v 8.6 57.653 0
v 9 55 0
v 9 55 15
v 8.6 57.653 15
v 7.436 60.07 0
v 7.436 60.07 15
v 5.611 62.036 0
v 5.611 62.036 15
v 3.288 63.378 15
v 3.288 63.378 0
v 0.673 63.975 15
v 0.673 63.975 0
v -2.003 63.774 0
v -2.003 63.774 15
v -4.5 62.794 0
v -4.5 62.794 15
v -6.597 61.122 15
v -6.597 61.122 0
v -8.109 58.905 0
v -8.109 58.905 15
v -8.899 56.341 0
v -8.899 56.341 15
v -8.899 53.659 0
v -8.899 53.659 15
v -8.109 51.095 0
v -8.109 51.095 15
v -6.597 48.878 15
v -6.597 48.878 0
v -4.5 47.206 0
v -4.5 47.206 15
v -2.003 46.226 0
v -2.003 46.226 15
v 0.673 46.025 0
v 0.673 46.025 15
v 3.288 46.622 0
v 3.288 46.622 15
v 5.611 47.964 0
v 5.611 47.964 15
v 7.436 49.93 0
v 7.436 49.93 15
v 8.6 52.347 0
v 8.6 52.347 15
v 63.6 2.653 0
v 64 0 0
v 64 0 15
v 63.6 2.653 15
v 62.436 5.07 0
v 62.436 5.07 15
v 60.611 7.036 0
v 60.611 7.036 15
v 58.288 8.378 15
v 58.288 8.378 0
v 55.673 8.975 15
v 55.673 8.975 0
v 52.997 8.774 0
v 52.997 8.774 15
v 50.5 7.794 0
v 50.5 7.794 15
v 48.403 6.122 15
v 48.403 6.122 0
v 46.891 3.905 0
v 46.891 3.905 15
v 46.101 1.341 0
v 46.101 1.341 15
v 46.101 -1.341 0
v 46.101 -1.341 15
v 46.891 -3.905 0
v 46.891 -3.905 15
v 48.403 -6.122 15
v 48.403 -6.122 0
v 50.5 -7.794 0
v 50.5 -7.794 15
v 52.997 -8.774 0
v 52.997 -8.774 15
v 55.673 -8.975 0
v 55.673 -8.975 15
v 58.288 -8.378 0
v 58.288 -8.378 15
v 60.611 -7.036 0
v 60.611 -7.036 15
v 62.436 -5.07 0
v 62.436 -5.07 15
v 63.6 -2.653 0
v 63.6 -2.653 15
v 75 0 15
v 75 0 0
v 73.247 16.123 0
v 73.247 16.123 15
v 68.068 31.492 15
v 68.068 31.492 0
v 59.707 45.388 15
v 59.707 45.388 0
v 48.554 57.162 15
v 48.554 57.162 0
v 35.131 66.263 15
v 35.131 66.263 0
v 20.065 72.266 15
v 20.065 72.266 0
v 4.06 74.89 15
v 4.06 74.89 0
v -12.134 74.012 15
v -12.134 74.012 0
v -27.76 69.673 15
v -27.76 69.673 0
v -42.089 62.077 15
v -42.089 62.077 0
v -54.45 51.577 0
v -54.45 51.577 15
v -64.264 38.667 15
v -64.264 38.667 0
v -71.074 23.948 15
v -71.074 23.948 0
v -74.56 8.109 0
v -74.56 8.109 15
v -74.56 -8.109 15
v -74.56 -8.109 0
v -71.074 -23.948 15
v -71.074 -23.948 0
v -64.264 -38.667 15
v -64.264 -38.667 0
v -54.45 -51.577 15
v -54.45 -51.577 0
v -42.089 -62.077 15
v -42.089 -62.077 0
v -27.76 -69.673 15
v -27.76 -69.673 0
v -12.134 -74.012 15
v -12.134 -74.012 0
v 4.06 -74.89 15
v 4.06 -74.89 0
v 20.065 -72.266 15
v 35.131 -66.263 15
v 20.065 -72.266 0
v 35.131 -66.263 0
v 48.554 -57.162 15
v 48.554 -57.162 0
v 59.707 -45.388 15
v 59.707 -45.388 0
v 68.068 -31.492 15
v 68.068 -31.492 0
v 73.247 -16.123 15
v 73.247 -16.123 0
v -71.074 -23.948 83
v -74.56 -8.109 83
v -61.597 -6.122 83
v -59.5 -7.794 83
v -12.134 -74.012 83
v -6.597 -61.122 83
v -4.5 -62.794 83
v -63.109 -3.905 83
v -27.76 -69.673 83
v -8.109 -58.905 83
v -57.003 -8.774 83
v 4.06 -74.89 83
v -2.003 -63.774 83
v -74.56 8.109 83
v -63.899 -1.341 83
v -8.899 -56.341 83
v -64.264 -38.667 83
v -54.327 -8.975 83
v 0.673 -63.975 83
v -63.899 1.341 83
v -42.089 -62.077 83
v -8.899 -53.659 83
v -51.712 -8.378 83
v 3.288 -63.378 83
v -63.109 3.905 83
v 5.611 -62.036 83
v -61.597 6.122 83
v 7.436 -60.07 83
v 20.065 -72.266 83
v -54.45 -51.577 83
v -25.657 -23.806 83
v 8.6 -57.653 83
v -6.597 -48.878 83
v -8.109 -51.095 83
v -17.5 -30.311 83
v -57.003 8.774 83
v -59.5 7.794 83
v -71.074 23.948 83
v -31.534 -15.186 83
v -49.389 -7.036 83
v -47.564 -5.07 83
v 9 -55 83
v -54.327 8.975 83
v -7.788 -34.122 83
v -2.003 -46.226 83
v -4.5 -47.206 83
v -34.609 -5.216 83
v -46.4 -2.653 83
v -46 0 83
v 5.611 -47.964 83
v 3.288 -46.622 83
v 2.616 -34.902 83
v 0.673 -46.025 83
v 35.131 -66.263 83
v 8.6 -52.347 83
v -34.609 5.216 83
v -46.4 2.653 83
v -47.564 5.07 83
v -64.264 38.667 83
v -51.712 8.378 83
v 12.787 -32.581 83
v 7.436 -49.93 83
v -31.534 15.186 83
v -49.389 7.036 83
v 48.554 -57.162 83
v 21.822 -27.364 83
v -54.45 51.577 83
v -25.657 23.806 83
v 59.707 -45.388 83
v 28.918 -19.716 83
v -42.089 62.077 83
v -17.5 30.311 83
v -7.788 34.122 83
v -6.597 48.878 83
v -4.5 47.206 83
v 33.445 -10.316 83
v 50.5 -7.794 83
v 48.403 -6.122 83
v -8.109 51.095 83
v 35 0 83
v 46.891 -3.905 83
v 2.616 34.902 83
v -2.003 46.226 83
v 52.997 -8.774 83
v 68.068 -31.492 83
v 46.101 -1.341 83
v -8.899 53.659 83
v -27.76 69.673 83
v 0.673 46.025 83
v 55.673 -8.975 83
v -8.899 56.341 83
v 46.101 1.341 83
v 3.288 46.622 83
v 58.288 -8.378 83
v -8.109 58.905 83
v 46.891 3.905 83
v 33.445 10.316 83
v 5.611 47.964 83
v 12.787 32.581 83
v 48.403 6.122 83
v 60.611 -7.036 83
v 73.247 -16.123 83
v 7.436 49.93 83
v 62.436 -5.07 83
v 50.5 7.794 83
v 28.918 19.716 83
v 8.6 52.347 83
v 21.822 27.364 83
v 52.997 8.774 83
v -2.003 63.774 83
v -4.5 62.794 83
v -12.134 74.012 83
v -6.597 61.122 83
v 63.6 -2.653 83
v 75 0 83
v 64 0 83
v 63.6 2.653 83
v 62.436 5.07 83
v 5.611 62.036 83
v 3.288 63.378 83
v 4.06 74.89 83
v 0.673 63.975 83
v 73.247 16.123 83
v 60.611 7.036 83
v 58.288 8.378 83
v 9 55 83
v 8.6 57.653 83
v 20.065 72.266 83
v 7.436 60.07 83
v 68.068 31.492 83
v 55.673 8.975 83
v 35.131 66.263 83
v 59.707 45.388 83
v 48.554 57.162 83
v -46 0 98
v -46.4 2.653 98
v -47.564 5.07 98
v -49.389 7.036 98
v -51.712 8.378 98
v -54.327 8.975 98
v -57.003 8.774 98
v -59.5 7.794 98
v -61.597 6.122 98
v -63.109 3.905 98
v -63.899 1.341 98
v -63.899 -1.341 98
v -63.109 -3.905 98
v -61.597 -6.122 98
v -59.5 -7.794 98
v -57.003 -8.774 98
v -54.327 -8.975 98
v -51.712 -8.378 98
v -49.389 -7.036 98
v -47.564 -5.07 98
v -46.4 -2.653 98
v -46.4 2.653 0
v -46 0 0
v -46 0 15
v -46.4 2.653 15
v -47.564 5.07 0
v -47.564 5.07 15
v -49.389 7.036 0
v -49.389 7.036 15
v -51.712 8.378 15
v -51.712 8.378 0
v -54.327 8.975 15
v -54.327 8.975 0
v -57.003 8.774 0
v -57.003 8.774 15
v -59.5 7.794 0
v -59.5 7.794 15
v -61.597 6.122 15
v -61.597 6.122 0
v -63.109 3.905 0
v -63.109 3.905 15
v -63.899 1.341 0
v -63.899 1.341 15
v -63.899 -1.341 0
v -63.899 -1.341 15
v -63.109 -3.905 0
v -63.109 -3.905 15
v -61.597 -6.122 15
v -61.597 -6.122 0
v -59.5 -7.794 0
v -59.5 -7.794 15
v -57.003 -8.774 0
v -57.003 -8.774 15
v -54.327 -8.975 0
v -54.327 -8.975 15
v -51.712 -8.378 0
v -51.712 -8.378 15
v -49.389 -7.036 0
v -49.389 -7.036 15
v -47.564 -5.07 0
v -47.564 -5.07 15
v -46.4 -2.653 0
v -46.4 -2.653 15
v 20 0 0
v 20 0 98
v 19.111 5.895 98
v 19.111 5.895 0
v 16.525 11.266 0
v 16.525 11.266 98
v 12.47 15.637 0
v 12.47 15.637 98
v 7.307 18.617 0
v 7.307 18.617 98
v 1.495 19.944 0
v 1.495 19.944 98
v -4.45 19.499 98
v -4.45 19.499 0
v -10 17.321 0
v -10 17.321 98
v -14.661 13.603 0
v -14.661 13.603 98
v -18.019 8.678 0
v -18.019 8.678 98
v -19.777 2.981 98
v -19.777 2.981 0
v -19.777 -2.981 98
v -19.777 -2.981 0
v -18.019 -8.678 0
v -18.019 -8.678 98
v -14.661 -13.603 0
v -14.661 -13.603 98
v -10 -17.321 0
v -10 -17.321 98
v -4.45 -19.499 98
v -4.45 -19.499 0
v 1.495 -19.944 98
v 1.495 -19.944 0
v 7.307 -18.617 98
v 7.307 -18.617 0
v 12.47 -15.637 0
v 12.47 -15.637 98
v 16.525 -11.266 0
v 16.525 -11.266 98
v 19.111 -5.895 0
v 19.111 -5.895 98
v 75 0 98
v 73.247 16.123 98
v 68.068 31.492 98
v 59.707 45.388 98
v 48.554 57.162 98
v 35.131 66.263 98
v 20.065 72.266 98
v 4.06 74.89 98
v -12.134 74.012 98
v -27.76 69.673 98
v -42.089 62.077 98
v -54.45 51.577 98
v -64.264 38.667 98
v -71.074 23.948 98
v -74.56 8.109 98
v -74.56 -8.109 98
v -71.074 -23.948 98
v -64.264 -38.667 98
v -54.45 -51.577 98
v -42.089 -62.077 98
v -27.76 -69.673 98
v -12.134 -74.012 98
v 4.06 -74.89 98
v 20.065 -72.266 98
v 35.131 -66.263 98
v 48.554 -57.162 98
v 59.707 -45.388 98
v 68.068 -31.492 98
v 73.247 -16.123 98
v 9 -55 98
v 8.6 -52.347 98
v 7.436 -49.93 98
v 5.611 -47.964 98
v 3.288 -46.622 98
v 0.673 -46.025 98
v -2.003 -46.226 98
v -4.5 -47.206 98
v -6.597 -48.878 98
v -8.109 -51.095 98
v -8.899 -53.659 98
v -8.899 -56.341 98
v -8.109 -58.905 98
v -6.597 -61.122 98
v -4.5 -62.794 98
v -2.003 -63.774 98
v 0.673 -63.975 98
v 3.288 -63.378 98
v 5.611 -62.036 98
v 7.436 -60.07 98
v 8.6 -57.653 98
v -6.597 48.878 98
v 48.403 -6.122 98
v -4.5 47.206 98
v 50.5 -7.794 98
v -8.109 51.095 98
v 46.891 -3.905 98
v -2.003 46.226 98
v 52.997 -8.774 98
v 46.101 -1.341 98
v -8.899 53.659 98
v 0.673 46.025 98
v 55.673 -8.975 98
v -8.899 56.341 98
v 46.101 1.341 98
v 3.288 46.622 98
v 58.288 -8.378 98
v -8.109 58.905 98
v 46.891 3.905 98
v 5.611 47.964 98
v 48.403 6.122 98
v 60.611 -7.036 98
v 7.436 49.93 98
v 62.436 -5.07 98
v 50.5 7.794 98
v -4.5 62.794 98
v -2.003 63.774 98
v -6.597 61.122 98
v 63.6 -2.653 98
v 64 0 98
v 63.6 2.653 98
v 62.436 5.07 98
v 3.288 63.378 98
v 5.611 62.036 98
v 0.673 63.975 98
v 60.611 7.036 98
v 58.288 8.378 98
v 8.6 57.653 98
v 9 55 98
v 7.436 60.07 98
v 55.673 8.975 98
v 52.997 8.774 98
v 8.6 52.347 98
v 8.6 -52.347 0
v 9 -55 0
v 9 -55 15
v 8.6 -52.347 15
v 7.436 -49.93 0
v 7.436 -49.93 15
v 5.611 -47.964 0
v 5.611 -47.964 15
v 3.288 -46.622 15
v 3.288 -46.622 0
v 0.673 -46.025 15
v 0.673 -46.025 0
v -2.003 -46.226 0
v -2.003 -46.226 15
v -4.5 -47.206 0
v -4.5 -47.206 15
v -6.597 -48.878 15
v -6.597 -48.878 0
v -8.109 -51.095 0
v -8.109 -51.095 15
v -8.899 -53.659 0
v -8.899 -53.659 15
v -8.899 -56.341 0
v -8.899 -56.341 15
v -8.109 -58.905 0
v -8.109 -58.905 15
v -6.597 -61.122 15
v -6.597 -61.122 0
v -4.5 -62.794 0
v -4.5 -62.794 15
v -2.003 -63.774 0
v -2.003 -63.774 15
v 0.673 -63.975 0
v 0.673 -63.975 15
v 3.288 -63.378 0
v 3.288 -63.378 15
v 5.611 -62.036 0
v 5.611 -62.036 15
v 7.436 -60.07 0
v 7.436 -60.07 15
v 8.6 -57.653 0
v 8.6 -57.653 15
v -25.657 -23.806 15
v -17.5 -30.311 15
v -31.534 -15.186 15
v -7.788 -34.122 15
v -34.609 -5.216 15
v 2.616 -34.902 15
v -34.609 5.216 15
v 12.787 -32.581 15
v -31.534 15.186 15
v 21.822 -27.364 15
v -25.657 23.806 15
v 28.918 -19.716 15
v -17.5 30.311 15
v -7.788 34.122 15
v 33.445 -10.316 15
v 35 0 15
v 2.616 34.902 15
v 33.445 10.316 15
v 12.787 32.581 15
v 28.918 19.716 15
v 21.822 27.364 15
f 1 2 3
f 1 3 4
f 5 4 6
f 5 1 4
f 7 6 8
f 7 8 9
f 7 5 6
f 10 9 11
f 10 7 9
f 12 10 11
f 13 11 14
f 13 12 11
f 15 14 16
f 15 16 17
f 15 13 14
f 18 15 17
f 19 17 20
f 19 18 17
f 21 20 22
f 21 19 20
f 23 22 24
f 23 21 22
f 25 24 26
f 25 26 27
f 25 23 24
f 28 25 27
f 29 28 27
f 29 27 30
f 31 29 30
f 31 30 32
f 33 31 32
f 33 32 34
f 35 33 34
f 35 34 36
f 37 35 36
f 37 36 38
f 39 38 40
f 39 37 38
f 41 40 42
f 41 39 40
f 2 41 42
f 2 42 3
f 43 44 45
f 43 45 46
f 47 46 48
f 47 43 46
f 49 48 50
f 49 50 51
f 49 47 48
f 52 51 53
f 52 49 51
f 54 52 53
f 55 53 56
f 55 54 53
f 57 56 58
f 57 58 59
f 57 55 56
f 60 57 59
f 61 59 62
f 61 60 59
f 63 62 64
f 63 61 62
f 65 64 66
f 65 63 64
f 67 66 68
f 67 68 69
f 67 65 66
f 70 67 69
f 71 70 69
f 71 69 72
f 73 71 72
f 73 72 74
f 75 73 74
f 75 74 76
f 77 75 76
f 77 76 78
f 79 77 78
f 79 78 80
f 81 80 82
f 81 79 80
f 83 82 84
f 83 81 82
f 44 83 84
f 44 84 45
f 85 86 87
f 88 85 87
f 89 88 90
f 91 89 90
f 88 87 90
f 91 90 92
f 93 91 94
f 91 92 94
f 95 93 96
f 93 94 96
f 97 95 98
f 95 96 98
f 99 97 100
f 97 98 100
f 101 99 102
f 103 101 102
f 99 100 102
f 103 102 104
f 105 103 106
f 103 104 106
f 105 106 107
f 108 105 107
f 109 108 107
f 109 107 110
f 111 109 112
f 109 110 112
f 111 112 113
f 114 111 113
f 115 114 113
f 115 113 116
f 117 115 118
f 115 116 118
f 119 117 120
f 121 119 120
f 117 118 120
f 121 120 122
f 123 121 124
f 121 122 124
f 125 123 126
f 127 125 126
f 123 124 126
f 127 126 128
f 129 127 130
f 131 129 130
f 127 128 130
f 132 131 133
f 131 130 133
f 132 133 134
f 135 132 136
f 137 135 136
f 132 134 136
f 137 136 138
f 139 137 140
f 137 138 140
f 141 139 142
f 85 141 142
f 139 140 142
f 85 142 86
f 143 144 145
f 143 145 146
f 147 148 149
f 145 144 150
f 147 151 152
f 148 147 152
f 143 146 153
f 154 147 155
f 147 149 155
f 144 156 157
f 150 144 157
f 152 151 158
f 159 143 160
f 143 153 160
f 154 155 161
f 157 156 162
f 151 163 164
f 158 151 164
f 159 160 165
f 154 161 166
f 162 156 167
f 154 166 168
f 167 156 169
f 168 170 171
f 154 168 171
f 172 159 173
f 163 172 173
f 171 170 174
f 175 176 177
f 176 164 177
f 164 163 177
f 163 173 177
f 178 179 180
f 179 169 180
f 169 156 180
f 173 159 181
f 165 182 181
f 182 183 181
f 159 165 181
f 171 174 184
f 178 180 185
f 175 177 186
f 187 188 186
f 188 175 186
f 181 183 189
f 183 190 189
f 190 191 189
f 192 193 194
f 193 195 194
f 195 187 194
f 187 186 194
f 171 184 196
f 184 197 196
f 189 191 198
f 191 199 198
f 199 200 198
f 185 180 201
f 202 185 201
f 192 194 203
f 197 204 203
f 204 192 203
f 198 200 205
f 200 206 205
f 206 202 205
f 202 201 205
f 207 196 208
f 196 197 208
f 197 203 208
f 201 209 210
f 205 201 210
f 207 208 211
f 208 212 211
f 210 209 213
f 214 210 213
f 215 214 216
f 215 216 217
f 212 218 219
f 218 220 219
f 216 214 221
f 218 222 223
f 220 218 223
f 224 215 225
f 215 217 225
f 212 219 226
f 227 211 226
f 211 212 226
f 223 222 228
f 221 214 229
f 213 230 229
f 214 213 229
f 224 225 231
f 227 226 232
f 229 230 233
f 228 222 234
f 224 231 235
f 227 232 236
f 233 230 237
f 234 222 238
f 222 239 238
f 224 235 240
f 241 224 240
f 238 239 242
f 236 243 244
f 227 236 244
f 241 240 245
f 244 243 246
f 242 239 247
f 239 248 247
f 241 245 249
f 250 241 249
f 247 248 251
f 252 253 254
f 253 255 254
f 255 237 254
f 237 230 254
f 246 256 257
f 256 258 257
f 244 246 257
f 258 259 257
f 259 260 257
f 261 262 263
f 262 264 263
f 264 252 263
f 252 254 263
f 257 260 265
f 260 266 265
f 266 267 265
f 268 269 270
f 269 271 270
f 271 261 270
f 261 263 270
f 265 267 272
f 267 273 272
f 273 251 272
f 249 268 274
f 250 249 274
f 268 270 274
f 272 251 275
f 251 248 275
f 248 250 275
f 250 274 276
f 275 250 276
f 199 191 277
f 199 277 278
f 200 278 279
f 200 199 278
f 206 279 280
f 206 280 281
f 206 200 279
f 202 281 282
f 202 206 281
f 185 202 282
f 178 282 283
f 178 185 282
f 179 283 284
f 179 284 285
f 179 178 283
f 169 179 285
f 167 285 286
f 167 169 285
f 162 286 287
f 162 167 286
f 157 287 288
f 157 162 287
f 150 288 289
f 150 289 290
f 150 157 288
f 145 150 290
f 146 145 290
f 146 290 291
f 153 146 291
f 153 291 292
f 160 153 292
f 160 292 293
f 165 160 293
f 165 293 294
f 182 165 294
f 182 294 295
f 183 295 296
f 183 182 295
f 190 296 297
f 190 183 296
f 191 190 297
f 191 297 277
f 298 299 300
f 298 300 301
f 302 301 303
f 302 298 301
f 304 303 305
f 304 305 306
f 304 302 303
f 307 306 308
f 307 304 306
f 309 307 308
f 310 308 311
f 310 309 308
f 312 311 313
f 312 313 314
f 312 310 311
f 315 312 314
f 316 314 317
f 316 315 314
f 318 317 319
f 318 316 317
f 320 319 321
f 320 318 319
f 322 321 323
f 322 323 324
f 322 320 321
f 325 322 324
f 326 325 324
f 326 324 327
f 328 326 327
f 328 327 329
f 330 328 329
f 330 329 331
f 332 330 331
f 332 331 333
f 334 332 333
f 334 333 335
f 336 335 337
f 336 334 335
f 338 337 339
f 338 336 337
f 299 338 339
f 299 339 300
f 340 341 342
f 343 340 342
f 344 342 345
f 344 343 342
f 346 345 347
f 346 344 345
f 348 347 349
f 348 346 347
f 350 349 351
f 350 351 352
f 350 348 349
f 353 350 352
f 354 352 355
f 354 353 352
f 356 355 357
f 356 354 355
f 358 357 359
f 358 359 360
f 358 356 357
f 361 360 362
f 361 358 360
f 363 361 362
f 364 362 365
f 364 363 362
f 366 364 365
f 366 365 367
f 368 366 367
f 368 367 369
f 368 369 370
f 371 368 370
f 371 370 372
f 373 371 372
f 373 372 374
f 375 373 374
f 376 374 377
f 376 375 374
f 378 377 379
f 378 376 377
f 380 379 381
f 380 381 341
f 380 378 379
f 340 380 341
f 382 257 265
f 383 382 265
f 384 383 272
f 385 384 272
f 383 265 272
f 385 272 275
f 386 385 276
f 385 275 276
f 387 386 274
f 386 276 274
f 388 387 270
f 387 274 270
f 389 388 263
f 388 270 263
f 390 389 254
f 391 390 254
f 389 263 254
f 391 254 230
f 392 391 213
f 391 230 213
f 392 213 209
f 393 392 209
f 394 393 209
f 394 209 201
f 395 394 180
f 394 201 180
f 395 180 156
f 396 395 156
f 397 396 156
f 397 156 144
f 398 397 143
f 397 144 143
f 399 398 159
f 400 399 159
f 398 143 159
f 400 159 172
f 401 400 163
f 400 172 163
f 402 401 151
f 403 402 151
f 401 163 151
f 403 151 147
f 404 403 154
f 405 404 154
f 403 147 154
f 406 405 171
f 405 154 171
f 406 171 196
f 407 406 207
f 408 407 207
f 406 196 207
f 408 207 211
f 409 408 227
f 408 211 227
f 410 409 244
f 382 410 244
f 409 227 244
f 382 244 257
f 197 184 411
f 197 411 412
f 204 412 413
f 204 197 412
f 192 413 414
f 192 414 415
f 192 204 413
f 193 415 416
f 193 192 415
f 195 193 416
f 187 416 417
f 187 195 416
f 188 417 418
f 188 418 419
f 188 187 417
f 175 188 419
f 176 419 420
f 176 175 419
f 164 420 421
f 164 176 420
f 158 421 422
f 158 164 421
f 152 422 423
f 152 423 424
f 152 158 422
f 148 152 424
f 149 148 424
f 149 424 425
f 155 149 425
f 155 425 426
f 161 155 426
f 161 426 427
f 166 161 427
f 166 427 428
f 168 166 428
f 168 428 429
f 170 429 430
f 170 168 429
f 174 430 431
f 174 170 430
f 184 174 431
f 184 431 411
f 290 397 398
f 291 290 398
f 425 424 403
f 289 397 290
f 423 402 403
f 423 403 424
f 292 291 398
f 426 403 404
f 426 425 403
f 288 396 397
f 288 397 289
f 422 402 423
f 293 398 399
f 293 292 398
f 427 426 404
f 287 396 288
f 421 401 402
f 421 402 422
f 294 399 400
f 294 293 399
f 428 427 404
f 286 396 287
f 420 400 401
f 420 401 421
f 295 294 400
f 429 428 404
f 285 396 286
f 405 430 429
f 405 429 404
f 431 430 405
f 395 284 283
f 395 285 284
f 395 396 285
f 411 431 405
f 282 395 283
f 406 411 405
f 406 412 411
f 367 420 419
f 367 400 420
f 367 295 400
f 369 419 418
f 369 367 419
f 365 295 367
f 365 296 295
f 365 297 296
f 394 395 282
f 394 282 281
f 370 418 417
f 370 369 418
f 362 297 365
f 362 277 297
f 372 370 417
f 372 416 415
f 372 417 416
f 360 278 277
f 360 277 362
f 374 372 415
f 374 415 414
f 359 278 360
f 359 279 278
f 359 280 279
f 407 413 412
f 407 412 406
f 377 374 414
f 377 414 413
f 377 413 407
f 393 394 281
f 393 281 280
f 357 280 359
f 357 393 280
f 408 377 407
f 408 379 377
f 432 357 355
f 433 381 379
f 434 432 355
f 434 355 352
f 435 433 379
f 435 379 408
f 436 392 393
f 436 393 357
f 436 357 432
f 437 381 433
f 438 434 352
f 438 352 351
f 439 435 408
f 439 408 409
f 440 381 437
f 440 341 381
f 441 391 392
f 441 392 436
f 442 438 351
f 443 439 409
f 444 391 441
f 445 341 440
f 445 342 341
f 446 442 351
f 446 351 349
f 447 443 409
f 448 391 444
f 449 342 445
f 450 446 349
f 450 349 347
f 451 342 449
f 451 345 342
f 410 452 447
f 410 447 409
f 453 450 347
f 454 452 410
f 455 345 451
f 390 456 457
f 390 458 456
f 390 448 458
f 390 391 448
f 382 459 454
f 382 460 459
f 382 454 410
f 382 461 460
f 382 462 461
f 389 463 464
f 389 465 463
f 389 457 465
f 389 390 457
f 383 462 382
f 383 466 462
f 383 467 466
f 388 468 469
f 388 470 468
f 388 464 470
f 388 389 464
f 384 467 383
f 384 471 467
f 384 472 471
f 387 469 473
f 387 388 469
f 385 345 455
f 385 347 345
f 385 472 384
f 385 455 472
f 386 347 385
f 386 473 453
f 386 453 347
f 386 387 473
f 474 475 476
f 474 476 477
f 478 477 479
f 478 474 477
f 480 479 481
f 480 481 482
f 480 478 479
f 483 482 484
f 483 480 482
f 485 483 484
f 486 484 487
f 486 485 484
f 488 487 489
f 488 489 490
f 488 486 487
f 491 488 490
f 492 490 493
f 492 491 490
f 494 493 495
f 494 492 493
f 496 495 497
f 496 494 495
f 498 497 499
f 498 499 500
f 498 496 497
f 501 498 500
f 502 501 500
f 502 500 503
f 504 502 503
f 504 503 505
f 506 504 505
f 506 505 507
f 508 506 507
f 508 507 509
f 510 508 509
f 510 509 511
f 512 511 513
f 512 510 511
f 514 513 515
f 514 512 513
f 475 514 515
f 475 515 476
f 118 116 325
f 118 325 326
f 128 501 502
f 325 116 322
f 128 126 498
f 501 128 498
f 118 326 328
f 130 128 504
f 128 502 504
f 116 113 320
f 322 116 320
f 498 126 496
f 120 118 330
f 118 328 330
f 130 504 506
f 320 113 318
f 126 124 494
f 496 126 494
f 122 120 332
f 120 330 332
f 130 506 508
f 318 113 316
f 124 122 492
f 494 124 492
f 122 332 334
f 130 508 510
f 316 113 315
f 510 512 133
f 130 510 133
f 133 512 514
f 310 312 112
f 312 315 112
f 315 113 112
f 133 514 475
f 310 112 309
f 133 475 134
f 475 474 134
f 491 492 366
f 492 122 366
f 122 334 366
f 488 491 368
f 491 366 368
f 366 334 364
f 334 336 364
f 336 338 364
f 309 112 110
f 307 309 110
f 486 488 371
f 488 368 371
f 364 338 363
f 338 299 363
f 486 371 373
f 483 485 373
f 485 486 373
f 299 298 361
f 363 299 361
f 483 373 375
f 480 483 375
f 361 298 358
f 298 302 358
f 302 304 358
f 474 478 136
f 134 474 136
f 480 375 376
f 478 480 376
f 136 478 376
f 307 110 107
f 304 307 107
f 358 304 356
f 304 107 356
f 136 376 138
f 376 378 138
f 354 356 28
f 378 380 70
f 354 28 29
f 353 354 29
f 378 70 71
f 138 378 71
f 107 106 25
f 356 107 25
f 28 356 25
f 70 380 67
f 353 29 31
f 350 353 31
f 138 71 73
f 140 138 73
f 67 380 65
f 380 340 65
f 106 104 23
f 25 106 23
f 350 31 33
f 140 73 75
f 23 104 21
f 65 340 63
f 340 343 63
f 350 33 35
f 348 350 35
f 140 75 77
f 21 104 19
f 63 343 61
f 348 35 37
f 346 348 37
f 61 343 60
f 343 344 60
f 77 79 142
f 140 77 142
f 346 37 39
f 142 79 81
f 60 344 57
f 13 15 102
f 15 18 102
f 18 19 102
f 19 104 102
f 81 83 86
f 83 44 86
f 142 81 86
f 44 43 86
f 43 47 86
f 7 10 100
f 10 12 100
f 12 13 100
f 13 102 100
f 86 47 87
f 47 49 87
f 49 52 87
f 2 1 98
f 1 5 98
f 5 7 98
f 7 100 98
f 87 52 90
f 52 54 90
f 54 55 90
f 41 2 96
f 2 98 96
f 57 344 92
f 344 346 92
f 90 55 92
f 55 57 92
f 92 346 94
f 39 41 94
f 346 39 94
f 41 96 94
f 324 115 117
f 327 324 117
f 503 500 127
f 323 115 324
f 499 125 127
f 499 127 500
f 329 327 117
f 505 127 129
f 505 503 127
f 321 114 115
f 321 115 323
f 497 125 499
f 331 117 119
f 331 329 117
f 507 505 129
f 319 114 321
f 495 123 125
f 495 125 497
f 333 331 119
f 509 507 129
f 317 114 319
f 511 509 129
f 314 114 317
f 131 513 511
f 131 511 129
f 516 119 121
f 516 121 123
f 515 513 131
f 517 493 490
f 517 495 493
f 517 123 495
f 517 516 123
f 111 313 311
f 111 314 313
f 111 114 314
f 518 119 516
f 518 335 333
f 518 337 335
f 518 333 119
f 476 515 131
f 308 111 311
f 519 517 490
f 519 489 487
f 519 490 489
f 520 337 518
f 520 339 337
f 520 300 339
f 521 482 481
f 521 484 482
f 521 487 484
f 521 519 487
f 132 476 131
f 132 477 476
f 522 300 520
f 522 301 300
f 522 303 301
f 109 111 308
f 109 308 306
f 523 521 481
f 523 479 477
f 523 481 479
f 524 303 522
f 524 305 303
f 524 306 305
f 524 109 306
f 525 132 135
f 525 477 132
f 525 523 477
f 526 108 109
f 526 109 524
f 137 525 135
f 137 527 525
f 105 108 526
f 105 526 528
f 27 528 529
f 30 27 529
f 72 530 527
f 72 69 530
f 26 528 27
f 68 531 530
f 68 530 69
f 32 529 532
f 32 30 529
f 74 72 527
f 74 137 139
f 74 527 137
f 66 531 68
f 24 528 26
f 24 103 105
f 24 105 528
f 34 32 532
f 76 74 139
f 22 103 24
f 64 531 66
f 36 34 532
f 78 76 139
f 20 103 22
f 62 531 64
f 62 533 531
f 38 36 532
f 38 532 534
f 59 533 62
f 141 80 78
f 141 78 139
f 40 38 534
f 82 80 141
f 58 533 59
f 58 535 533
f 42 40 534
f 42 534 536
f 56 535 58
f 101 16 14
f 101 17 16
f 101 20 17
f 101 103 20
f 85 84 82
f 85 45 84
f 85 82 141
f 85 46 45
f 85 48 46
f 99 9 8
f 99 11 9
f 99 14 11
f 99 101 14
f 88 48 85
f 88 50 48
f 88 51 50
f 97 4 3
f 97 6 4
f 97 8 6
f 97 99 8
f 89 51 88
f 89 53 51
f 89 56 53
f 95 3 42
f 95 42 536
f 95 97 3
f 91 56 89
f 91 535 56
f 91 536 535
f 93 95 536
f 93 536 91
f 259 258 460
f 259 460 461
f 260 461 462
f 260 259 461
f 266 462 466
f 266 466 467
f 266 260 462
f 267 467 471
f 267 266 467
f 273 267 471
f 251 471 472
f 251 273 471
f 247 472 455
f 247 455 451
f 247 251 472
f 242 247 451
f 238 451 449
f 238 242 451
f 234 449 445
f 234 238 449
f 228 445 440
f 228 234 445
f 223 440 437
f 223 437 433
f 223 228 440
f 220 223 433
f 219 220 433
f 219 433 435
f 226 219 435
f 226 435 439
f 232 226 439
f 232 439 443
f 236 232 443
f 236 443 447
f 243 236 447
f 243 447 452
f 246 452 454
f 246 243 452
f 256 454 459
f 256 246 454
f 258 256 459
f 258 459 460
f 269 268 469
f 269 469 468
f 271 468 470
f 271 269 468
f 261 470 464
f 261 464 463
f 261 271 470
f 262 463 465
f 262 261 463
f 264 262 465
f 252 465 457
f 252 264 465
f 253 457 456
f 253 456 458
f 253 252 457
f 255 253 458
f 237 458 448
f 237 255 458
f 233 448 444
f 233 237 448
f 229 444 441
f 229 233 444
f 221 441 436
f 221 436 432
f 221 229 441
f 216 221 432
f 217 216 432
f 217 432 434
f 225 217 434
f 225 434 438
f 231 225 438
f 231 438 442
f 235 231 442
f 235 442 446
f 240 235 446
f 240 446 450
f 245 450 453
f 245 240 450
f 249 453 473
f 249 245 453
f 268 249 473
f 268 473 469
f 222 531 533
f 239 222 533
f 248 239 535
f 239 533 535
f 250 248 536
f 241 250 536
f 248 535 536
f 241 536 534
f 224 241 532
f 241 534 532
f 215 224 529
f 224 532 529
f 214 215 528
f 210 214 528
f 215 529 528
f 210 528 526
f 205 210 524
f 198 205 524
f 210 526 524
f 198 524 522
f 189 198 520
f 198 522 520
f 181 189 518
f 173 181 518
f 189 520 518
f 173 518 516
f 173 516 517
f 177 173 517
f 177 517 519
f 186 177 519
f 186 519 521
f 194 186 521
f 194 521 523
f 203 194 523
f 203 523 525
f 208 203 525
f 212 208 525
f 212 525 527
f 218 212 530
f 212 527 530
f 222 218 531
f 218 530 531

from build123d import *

# Parameters (mm, degrees)
F0_R     = 75
F0_R_2   = 9
F0_R_3   = 20
F1_DEPTH = 15
F2_R     = 35
F2_R_2   = 20
F3_DEPTH = 68
F4_R     = 75
F4_R_2   = 9
F4_R_3   = 20
F5_DEPTH = 15


with BuildPart() as f1:
    # F0 (on Top) → F1 (new body)
    with BuildSketch(Plane.XY):
        Circle(F0_R)
        with Locations((0, -55)):
            Circle(F0_R_2, mode=Mode.SUBTRACT)
        with Locations((-55, 0)):
            Circle(F0_R_2, mode=Mode.SUBTRACT)
        Circle(F0_R_3, mode=Mode.SUBTRACT)
        with Locations((55, 0)):
            Circle(F0_R_2, mode=Mode.SUBTRACT)
        with Locations((0, 55)):
            Circle(F0_R_2, mode=Mode.SUBTRACT)
    extrude(amount=F1_DEPTH)

    # F2 (on face) → F3 (join)
    with BuildSketch(Plane.XY.offset(15)):
        Circle(F2_R)
        Circle(F2_R_2, mode=Mode.SUBTRACT)
    extrude(amount=F3_DEPTH)

    # F4 (on face) → F5 (join)
    with BuildSketch(Plane.XY.offset(83)):
        Circle(F4_R)
        with Locations((0, -55)):
            Circle(F4_R_2, mode=Mode.SUBTRACT)
        with Locations((-55, 0)):
            Circle(F4_R_2, mode=Mode.SUBTRACT)
        Circle(F4_R_3, mode=Mode.SUBTRACT)
        with Locations((55, 0)):
            Circle(F4_R_2, mode=Mode.SUBTRACT)
        with Locations((0, 55)):
            Circle(F4_R_2, mode=Mode.SUBTRACT)
    extrude(amount=F5_DEPTH)


solid = f1.part
